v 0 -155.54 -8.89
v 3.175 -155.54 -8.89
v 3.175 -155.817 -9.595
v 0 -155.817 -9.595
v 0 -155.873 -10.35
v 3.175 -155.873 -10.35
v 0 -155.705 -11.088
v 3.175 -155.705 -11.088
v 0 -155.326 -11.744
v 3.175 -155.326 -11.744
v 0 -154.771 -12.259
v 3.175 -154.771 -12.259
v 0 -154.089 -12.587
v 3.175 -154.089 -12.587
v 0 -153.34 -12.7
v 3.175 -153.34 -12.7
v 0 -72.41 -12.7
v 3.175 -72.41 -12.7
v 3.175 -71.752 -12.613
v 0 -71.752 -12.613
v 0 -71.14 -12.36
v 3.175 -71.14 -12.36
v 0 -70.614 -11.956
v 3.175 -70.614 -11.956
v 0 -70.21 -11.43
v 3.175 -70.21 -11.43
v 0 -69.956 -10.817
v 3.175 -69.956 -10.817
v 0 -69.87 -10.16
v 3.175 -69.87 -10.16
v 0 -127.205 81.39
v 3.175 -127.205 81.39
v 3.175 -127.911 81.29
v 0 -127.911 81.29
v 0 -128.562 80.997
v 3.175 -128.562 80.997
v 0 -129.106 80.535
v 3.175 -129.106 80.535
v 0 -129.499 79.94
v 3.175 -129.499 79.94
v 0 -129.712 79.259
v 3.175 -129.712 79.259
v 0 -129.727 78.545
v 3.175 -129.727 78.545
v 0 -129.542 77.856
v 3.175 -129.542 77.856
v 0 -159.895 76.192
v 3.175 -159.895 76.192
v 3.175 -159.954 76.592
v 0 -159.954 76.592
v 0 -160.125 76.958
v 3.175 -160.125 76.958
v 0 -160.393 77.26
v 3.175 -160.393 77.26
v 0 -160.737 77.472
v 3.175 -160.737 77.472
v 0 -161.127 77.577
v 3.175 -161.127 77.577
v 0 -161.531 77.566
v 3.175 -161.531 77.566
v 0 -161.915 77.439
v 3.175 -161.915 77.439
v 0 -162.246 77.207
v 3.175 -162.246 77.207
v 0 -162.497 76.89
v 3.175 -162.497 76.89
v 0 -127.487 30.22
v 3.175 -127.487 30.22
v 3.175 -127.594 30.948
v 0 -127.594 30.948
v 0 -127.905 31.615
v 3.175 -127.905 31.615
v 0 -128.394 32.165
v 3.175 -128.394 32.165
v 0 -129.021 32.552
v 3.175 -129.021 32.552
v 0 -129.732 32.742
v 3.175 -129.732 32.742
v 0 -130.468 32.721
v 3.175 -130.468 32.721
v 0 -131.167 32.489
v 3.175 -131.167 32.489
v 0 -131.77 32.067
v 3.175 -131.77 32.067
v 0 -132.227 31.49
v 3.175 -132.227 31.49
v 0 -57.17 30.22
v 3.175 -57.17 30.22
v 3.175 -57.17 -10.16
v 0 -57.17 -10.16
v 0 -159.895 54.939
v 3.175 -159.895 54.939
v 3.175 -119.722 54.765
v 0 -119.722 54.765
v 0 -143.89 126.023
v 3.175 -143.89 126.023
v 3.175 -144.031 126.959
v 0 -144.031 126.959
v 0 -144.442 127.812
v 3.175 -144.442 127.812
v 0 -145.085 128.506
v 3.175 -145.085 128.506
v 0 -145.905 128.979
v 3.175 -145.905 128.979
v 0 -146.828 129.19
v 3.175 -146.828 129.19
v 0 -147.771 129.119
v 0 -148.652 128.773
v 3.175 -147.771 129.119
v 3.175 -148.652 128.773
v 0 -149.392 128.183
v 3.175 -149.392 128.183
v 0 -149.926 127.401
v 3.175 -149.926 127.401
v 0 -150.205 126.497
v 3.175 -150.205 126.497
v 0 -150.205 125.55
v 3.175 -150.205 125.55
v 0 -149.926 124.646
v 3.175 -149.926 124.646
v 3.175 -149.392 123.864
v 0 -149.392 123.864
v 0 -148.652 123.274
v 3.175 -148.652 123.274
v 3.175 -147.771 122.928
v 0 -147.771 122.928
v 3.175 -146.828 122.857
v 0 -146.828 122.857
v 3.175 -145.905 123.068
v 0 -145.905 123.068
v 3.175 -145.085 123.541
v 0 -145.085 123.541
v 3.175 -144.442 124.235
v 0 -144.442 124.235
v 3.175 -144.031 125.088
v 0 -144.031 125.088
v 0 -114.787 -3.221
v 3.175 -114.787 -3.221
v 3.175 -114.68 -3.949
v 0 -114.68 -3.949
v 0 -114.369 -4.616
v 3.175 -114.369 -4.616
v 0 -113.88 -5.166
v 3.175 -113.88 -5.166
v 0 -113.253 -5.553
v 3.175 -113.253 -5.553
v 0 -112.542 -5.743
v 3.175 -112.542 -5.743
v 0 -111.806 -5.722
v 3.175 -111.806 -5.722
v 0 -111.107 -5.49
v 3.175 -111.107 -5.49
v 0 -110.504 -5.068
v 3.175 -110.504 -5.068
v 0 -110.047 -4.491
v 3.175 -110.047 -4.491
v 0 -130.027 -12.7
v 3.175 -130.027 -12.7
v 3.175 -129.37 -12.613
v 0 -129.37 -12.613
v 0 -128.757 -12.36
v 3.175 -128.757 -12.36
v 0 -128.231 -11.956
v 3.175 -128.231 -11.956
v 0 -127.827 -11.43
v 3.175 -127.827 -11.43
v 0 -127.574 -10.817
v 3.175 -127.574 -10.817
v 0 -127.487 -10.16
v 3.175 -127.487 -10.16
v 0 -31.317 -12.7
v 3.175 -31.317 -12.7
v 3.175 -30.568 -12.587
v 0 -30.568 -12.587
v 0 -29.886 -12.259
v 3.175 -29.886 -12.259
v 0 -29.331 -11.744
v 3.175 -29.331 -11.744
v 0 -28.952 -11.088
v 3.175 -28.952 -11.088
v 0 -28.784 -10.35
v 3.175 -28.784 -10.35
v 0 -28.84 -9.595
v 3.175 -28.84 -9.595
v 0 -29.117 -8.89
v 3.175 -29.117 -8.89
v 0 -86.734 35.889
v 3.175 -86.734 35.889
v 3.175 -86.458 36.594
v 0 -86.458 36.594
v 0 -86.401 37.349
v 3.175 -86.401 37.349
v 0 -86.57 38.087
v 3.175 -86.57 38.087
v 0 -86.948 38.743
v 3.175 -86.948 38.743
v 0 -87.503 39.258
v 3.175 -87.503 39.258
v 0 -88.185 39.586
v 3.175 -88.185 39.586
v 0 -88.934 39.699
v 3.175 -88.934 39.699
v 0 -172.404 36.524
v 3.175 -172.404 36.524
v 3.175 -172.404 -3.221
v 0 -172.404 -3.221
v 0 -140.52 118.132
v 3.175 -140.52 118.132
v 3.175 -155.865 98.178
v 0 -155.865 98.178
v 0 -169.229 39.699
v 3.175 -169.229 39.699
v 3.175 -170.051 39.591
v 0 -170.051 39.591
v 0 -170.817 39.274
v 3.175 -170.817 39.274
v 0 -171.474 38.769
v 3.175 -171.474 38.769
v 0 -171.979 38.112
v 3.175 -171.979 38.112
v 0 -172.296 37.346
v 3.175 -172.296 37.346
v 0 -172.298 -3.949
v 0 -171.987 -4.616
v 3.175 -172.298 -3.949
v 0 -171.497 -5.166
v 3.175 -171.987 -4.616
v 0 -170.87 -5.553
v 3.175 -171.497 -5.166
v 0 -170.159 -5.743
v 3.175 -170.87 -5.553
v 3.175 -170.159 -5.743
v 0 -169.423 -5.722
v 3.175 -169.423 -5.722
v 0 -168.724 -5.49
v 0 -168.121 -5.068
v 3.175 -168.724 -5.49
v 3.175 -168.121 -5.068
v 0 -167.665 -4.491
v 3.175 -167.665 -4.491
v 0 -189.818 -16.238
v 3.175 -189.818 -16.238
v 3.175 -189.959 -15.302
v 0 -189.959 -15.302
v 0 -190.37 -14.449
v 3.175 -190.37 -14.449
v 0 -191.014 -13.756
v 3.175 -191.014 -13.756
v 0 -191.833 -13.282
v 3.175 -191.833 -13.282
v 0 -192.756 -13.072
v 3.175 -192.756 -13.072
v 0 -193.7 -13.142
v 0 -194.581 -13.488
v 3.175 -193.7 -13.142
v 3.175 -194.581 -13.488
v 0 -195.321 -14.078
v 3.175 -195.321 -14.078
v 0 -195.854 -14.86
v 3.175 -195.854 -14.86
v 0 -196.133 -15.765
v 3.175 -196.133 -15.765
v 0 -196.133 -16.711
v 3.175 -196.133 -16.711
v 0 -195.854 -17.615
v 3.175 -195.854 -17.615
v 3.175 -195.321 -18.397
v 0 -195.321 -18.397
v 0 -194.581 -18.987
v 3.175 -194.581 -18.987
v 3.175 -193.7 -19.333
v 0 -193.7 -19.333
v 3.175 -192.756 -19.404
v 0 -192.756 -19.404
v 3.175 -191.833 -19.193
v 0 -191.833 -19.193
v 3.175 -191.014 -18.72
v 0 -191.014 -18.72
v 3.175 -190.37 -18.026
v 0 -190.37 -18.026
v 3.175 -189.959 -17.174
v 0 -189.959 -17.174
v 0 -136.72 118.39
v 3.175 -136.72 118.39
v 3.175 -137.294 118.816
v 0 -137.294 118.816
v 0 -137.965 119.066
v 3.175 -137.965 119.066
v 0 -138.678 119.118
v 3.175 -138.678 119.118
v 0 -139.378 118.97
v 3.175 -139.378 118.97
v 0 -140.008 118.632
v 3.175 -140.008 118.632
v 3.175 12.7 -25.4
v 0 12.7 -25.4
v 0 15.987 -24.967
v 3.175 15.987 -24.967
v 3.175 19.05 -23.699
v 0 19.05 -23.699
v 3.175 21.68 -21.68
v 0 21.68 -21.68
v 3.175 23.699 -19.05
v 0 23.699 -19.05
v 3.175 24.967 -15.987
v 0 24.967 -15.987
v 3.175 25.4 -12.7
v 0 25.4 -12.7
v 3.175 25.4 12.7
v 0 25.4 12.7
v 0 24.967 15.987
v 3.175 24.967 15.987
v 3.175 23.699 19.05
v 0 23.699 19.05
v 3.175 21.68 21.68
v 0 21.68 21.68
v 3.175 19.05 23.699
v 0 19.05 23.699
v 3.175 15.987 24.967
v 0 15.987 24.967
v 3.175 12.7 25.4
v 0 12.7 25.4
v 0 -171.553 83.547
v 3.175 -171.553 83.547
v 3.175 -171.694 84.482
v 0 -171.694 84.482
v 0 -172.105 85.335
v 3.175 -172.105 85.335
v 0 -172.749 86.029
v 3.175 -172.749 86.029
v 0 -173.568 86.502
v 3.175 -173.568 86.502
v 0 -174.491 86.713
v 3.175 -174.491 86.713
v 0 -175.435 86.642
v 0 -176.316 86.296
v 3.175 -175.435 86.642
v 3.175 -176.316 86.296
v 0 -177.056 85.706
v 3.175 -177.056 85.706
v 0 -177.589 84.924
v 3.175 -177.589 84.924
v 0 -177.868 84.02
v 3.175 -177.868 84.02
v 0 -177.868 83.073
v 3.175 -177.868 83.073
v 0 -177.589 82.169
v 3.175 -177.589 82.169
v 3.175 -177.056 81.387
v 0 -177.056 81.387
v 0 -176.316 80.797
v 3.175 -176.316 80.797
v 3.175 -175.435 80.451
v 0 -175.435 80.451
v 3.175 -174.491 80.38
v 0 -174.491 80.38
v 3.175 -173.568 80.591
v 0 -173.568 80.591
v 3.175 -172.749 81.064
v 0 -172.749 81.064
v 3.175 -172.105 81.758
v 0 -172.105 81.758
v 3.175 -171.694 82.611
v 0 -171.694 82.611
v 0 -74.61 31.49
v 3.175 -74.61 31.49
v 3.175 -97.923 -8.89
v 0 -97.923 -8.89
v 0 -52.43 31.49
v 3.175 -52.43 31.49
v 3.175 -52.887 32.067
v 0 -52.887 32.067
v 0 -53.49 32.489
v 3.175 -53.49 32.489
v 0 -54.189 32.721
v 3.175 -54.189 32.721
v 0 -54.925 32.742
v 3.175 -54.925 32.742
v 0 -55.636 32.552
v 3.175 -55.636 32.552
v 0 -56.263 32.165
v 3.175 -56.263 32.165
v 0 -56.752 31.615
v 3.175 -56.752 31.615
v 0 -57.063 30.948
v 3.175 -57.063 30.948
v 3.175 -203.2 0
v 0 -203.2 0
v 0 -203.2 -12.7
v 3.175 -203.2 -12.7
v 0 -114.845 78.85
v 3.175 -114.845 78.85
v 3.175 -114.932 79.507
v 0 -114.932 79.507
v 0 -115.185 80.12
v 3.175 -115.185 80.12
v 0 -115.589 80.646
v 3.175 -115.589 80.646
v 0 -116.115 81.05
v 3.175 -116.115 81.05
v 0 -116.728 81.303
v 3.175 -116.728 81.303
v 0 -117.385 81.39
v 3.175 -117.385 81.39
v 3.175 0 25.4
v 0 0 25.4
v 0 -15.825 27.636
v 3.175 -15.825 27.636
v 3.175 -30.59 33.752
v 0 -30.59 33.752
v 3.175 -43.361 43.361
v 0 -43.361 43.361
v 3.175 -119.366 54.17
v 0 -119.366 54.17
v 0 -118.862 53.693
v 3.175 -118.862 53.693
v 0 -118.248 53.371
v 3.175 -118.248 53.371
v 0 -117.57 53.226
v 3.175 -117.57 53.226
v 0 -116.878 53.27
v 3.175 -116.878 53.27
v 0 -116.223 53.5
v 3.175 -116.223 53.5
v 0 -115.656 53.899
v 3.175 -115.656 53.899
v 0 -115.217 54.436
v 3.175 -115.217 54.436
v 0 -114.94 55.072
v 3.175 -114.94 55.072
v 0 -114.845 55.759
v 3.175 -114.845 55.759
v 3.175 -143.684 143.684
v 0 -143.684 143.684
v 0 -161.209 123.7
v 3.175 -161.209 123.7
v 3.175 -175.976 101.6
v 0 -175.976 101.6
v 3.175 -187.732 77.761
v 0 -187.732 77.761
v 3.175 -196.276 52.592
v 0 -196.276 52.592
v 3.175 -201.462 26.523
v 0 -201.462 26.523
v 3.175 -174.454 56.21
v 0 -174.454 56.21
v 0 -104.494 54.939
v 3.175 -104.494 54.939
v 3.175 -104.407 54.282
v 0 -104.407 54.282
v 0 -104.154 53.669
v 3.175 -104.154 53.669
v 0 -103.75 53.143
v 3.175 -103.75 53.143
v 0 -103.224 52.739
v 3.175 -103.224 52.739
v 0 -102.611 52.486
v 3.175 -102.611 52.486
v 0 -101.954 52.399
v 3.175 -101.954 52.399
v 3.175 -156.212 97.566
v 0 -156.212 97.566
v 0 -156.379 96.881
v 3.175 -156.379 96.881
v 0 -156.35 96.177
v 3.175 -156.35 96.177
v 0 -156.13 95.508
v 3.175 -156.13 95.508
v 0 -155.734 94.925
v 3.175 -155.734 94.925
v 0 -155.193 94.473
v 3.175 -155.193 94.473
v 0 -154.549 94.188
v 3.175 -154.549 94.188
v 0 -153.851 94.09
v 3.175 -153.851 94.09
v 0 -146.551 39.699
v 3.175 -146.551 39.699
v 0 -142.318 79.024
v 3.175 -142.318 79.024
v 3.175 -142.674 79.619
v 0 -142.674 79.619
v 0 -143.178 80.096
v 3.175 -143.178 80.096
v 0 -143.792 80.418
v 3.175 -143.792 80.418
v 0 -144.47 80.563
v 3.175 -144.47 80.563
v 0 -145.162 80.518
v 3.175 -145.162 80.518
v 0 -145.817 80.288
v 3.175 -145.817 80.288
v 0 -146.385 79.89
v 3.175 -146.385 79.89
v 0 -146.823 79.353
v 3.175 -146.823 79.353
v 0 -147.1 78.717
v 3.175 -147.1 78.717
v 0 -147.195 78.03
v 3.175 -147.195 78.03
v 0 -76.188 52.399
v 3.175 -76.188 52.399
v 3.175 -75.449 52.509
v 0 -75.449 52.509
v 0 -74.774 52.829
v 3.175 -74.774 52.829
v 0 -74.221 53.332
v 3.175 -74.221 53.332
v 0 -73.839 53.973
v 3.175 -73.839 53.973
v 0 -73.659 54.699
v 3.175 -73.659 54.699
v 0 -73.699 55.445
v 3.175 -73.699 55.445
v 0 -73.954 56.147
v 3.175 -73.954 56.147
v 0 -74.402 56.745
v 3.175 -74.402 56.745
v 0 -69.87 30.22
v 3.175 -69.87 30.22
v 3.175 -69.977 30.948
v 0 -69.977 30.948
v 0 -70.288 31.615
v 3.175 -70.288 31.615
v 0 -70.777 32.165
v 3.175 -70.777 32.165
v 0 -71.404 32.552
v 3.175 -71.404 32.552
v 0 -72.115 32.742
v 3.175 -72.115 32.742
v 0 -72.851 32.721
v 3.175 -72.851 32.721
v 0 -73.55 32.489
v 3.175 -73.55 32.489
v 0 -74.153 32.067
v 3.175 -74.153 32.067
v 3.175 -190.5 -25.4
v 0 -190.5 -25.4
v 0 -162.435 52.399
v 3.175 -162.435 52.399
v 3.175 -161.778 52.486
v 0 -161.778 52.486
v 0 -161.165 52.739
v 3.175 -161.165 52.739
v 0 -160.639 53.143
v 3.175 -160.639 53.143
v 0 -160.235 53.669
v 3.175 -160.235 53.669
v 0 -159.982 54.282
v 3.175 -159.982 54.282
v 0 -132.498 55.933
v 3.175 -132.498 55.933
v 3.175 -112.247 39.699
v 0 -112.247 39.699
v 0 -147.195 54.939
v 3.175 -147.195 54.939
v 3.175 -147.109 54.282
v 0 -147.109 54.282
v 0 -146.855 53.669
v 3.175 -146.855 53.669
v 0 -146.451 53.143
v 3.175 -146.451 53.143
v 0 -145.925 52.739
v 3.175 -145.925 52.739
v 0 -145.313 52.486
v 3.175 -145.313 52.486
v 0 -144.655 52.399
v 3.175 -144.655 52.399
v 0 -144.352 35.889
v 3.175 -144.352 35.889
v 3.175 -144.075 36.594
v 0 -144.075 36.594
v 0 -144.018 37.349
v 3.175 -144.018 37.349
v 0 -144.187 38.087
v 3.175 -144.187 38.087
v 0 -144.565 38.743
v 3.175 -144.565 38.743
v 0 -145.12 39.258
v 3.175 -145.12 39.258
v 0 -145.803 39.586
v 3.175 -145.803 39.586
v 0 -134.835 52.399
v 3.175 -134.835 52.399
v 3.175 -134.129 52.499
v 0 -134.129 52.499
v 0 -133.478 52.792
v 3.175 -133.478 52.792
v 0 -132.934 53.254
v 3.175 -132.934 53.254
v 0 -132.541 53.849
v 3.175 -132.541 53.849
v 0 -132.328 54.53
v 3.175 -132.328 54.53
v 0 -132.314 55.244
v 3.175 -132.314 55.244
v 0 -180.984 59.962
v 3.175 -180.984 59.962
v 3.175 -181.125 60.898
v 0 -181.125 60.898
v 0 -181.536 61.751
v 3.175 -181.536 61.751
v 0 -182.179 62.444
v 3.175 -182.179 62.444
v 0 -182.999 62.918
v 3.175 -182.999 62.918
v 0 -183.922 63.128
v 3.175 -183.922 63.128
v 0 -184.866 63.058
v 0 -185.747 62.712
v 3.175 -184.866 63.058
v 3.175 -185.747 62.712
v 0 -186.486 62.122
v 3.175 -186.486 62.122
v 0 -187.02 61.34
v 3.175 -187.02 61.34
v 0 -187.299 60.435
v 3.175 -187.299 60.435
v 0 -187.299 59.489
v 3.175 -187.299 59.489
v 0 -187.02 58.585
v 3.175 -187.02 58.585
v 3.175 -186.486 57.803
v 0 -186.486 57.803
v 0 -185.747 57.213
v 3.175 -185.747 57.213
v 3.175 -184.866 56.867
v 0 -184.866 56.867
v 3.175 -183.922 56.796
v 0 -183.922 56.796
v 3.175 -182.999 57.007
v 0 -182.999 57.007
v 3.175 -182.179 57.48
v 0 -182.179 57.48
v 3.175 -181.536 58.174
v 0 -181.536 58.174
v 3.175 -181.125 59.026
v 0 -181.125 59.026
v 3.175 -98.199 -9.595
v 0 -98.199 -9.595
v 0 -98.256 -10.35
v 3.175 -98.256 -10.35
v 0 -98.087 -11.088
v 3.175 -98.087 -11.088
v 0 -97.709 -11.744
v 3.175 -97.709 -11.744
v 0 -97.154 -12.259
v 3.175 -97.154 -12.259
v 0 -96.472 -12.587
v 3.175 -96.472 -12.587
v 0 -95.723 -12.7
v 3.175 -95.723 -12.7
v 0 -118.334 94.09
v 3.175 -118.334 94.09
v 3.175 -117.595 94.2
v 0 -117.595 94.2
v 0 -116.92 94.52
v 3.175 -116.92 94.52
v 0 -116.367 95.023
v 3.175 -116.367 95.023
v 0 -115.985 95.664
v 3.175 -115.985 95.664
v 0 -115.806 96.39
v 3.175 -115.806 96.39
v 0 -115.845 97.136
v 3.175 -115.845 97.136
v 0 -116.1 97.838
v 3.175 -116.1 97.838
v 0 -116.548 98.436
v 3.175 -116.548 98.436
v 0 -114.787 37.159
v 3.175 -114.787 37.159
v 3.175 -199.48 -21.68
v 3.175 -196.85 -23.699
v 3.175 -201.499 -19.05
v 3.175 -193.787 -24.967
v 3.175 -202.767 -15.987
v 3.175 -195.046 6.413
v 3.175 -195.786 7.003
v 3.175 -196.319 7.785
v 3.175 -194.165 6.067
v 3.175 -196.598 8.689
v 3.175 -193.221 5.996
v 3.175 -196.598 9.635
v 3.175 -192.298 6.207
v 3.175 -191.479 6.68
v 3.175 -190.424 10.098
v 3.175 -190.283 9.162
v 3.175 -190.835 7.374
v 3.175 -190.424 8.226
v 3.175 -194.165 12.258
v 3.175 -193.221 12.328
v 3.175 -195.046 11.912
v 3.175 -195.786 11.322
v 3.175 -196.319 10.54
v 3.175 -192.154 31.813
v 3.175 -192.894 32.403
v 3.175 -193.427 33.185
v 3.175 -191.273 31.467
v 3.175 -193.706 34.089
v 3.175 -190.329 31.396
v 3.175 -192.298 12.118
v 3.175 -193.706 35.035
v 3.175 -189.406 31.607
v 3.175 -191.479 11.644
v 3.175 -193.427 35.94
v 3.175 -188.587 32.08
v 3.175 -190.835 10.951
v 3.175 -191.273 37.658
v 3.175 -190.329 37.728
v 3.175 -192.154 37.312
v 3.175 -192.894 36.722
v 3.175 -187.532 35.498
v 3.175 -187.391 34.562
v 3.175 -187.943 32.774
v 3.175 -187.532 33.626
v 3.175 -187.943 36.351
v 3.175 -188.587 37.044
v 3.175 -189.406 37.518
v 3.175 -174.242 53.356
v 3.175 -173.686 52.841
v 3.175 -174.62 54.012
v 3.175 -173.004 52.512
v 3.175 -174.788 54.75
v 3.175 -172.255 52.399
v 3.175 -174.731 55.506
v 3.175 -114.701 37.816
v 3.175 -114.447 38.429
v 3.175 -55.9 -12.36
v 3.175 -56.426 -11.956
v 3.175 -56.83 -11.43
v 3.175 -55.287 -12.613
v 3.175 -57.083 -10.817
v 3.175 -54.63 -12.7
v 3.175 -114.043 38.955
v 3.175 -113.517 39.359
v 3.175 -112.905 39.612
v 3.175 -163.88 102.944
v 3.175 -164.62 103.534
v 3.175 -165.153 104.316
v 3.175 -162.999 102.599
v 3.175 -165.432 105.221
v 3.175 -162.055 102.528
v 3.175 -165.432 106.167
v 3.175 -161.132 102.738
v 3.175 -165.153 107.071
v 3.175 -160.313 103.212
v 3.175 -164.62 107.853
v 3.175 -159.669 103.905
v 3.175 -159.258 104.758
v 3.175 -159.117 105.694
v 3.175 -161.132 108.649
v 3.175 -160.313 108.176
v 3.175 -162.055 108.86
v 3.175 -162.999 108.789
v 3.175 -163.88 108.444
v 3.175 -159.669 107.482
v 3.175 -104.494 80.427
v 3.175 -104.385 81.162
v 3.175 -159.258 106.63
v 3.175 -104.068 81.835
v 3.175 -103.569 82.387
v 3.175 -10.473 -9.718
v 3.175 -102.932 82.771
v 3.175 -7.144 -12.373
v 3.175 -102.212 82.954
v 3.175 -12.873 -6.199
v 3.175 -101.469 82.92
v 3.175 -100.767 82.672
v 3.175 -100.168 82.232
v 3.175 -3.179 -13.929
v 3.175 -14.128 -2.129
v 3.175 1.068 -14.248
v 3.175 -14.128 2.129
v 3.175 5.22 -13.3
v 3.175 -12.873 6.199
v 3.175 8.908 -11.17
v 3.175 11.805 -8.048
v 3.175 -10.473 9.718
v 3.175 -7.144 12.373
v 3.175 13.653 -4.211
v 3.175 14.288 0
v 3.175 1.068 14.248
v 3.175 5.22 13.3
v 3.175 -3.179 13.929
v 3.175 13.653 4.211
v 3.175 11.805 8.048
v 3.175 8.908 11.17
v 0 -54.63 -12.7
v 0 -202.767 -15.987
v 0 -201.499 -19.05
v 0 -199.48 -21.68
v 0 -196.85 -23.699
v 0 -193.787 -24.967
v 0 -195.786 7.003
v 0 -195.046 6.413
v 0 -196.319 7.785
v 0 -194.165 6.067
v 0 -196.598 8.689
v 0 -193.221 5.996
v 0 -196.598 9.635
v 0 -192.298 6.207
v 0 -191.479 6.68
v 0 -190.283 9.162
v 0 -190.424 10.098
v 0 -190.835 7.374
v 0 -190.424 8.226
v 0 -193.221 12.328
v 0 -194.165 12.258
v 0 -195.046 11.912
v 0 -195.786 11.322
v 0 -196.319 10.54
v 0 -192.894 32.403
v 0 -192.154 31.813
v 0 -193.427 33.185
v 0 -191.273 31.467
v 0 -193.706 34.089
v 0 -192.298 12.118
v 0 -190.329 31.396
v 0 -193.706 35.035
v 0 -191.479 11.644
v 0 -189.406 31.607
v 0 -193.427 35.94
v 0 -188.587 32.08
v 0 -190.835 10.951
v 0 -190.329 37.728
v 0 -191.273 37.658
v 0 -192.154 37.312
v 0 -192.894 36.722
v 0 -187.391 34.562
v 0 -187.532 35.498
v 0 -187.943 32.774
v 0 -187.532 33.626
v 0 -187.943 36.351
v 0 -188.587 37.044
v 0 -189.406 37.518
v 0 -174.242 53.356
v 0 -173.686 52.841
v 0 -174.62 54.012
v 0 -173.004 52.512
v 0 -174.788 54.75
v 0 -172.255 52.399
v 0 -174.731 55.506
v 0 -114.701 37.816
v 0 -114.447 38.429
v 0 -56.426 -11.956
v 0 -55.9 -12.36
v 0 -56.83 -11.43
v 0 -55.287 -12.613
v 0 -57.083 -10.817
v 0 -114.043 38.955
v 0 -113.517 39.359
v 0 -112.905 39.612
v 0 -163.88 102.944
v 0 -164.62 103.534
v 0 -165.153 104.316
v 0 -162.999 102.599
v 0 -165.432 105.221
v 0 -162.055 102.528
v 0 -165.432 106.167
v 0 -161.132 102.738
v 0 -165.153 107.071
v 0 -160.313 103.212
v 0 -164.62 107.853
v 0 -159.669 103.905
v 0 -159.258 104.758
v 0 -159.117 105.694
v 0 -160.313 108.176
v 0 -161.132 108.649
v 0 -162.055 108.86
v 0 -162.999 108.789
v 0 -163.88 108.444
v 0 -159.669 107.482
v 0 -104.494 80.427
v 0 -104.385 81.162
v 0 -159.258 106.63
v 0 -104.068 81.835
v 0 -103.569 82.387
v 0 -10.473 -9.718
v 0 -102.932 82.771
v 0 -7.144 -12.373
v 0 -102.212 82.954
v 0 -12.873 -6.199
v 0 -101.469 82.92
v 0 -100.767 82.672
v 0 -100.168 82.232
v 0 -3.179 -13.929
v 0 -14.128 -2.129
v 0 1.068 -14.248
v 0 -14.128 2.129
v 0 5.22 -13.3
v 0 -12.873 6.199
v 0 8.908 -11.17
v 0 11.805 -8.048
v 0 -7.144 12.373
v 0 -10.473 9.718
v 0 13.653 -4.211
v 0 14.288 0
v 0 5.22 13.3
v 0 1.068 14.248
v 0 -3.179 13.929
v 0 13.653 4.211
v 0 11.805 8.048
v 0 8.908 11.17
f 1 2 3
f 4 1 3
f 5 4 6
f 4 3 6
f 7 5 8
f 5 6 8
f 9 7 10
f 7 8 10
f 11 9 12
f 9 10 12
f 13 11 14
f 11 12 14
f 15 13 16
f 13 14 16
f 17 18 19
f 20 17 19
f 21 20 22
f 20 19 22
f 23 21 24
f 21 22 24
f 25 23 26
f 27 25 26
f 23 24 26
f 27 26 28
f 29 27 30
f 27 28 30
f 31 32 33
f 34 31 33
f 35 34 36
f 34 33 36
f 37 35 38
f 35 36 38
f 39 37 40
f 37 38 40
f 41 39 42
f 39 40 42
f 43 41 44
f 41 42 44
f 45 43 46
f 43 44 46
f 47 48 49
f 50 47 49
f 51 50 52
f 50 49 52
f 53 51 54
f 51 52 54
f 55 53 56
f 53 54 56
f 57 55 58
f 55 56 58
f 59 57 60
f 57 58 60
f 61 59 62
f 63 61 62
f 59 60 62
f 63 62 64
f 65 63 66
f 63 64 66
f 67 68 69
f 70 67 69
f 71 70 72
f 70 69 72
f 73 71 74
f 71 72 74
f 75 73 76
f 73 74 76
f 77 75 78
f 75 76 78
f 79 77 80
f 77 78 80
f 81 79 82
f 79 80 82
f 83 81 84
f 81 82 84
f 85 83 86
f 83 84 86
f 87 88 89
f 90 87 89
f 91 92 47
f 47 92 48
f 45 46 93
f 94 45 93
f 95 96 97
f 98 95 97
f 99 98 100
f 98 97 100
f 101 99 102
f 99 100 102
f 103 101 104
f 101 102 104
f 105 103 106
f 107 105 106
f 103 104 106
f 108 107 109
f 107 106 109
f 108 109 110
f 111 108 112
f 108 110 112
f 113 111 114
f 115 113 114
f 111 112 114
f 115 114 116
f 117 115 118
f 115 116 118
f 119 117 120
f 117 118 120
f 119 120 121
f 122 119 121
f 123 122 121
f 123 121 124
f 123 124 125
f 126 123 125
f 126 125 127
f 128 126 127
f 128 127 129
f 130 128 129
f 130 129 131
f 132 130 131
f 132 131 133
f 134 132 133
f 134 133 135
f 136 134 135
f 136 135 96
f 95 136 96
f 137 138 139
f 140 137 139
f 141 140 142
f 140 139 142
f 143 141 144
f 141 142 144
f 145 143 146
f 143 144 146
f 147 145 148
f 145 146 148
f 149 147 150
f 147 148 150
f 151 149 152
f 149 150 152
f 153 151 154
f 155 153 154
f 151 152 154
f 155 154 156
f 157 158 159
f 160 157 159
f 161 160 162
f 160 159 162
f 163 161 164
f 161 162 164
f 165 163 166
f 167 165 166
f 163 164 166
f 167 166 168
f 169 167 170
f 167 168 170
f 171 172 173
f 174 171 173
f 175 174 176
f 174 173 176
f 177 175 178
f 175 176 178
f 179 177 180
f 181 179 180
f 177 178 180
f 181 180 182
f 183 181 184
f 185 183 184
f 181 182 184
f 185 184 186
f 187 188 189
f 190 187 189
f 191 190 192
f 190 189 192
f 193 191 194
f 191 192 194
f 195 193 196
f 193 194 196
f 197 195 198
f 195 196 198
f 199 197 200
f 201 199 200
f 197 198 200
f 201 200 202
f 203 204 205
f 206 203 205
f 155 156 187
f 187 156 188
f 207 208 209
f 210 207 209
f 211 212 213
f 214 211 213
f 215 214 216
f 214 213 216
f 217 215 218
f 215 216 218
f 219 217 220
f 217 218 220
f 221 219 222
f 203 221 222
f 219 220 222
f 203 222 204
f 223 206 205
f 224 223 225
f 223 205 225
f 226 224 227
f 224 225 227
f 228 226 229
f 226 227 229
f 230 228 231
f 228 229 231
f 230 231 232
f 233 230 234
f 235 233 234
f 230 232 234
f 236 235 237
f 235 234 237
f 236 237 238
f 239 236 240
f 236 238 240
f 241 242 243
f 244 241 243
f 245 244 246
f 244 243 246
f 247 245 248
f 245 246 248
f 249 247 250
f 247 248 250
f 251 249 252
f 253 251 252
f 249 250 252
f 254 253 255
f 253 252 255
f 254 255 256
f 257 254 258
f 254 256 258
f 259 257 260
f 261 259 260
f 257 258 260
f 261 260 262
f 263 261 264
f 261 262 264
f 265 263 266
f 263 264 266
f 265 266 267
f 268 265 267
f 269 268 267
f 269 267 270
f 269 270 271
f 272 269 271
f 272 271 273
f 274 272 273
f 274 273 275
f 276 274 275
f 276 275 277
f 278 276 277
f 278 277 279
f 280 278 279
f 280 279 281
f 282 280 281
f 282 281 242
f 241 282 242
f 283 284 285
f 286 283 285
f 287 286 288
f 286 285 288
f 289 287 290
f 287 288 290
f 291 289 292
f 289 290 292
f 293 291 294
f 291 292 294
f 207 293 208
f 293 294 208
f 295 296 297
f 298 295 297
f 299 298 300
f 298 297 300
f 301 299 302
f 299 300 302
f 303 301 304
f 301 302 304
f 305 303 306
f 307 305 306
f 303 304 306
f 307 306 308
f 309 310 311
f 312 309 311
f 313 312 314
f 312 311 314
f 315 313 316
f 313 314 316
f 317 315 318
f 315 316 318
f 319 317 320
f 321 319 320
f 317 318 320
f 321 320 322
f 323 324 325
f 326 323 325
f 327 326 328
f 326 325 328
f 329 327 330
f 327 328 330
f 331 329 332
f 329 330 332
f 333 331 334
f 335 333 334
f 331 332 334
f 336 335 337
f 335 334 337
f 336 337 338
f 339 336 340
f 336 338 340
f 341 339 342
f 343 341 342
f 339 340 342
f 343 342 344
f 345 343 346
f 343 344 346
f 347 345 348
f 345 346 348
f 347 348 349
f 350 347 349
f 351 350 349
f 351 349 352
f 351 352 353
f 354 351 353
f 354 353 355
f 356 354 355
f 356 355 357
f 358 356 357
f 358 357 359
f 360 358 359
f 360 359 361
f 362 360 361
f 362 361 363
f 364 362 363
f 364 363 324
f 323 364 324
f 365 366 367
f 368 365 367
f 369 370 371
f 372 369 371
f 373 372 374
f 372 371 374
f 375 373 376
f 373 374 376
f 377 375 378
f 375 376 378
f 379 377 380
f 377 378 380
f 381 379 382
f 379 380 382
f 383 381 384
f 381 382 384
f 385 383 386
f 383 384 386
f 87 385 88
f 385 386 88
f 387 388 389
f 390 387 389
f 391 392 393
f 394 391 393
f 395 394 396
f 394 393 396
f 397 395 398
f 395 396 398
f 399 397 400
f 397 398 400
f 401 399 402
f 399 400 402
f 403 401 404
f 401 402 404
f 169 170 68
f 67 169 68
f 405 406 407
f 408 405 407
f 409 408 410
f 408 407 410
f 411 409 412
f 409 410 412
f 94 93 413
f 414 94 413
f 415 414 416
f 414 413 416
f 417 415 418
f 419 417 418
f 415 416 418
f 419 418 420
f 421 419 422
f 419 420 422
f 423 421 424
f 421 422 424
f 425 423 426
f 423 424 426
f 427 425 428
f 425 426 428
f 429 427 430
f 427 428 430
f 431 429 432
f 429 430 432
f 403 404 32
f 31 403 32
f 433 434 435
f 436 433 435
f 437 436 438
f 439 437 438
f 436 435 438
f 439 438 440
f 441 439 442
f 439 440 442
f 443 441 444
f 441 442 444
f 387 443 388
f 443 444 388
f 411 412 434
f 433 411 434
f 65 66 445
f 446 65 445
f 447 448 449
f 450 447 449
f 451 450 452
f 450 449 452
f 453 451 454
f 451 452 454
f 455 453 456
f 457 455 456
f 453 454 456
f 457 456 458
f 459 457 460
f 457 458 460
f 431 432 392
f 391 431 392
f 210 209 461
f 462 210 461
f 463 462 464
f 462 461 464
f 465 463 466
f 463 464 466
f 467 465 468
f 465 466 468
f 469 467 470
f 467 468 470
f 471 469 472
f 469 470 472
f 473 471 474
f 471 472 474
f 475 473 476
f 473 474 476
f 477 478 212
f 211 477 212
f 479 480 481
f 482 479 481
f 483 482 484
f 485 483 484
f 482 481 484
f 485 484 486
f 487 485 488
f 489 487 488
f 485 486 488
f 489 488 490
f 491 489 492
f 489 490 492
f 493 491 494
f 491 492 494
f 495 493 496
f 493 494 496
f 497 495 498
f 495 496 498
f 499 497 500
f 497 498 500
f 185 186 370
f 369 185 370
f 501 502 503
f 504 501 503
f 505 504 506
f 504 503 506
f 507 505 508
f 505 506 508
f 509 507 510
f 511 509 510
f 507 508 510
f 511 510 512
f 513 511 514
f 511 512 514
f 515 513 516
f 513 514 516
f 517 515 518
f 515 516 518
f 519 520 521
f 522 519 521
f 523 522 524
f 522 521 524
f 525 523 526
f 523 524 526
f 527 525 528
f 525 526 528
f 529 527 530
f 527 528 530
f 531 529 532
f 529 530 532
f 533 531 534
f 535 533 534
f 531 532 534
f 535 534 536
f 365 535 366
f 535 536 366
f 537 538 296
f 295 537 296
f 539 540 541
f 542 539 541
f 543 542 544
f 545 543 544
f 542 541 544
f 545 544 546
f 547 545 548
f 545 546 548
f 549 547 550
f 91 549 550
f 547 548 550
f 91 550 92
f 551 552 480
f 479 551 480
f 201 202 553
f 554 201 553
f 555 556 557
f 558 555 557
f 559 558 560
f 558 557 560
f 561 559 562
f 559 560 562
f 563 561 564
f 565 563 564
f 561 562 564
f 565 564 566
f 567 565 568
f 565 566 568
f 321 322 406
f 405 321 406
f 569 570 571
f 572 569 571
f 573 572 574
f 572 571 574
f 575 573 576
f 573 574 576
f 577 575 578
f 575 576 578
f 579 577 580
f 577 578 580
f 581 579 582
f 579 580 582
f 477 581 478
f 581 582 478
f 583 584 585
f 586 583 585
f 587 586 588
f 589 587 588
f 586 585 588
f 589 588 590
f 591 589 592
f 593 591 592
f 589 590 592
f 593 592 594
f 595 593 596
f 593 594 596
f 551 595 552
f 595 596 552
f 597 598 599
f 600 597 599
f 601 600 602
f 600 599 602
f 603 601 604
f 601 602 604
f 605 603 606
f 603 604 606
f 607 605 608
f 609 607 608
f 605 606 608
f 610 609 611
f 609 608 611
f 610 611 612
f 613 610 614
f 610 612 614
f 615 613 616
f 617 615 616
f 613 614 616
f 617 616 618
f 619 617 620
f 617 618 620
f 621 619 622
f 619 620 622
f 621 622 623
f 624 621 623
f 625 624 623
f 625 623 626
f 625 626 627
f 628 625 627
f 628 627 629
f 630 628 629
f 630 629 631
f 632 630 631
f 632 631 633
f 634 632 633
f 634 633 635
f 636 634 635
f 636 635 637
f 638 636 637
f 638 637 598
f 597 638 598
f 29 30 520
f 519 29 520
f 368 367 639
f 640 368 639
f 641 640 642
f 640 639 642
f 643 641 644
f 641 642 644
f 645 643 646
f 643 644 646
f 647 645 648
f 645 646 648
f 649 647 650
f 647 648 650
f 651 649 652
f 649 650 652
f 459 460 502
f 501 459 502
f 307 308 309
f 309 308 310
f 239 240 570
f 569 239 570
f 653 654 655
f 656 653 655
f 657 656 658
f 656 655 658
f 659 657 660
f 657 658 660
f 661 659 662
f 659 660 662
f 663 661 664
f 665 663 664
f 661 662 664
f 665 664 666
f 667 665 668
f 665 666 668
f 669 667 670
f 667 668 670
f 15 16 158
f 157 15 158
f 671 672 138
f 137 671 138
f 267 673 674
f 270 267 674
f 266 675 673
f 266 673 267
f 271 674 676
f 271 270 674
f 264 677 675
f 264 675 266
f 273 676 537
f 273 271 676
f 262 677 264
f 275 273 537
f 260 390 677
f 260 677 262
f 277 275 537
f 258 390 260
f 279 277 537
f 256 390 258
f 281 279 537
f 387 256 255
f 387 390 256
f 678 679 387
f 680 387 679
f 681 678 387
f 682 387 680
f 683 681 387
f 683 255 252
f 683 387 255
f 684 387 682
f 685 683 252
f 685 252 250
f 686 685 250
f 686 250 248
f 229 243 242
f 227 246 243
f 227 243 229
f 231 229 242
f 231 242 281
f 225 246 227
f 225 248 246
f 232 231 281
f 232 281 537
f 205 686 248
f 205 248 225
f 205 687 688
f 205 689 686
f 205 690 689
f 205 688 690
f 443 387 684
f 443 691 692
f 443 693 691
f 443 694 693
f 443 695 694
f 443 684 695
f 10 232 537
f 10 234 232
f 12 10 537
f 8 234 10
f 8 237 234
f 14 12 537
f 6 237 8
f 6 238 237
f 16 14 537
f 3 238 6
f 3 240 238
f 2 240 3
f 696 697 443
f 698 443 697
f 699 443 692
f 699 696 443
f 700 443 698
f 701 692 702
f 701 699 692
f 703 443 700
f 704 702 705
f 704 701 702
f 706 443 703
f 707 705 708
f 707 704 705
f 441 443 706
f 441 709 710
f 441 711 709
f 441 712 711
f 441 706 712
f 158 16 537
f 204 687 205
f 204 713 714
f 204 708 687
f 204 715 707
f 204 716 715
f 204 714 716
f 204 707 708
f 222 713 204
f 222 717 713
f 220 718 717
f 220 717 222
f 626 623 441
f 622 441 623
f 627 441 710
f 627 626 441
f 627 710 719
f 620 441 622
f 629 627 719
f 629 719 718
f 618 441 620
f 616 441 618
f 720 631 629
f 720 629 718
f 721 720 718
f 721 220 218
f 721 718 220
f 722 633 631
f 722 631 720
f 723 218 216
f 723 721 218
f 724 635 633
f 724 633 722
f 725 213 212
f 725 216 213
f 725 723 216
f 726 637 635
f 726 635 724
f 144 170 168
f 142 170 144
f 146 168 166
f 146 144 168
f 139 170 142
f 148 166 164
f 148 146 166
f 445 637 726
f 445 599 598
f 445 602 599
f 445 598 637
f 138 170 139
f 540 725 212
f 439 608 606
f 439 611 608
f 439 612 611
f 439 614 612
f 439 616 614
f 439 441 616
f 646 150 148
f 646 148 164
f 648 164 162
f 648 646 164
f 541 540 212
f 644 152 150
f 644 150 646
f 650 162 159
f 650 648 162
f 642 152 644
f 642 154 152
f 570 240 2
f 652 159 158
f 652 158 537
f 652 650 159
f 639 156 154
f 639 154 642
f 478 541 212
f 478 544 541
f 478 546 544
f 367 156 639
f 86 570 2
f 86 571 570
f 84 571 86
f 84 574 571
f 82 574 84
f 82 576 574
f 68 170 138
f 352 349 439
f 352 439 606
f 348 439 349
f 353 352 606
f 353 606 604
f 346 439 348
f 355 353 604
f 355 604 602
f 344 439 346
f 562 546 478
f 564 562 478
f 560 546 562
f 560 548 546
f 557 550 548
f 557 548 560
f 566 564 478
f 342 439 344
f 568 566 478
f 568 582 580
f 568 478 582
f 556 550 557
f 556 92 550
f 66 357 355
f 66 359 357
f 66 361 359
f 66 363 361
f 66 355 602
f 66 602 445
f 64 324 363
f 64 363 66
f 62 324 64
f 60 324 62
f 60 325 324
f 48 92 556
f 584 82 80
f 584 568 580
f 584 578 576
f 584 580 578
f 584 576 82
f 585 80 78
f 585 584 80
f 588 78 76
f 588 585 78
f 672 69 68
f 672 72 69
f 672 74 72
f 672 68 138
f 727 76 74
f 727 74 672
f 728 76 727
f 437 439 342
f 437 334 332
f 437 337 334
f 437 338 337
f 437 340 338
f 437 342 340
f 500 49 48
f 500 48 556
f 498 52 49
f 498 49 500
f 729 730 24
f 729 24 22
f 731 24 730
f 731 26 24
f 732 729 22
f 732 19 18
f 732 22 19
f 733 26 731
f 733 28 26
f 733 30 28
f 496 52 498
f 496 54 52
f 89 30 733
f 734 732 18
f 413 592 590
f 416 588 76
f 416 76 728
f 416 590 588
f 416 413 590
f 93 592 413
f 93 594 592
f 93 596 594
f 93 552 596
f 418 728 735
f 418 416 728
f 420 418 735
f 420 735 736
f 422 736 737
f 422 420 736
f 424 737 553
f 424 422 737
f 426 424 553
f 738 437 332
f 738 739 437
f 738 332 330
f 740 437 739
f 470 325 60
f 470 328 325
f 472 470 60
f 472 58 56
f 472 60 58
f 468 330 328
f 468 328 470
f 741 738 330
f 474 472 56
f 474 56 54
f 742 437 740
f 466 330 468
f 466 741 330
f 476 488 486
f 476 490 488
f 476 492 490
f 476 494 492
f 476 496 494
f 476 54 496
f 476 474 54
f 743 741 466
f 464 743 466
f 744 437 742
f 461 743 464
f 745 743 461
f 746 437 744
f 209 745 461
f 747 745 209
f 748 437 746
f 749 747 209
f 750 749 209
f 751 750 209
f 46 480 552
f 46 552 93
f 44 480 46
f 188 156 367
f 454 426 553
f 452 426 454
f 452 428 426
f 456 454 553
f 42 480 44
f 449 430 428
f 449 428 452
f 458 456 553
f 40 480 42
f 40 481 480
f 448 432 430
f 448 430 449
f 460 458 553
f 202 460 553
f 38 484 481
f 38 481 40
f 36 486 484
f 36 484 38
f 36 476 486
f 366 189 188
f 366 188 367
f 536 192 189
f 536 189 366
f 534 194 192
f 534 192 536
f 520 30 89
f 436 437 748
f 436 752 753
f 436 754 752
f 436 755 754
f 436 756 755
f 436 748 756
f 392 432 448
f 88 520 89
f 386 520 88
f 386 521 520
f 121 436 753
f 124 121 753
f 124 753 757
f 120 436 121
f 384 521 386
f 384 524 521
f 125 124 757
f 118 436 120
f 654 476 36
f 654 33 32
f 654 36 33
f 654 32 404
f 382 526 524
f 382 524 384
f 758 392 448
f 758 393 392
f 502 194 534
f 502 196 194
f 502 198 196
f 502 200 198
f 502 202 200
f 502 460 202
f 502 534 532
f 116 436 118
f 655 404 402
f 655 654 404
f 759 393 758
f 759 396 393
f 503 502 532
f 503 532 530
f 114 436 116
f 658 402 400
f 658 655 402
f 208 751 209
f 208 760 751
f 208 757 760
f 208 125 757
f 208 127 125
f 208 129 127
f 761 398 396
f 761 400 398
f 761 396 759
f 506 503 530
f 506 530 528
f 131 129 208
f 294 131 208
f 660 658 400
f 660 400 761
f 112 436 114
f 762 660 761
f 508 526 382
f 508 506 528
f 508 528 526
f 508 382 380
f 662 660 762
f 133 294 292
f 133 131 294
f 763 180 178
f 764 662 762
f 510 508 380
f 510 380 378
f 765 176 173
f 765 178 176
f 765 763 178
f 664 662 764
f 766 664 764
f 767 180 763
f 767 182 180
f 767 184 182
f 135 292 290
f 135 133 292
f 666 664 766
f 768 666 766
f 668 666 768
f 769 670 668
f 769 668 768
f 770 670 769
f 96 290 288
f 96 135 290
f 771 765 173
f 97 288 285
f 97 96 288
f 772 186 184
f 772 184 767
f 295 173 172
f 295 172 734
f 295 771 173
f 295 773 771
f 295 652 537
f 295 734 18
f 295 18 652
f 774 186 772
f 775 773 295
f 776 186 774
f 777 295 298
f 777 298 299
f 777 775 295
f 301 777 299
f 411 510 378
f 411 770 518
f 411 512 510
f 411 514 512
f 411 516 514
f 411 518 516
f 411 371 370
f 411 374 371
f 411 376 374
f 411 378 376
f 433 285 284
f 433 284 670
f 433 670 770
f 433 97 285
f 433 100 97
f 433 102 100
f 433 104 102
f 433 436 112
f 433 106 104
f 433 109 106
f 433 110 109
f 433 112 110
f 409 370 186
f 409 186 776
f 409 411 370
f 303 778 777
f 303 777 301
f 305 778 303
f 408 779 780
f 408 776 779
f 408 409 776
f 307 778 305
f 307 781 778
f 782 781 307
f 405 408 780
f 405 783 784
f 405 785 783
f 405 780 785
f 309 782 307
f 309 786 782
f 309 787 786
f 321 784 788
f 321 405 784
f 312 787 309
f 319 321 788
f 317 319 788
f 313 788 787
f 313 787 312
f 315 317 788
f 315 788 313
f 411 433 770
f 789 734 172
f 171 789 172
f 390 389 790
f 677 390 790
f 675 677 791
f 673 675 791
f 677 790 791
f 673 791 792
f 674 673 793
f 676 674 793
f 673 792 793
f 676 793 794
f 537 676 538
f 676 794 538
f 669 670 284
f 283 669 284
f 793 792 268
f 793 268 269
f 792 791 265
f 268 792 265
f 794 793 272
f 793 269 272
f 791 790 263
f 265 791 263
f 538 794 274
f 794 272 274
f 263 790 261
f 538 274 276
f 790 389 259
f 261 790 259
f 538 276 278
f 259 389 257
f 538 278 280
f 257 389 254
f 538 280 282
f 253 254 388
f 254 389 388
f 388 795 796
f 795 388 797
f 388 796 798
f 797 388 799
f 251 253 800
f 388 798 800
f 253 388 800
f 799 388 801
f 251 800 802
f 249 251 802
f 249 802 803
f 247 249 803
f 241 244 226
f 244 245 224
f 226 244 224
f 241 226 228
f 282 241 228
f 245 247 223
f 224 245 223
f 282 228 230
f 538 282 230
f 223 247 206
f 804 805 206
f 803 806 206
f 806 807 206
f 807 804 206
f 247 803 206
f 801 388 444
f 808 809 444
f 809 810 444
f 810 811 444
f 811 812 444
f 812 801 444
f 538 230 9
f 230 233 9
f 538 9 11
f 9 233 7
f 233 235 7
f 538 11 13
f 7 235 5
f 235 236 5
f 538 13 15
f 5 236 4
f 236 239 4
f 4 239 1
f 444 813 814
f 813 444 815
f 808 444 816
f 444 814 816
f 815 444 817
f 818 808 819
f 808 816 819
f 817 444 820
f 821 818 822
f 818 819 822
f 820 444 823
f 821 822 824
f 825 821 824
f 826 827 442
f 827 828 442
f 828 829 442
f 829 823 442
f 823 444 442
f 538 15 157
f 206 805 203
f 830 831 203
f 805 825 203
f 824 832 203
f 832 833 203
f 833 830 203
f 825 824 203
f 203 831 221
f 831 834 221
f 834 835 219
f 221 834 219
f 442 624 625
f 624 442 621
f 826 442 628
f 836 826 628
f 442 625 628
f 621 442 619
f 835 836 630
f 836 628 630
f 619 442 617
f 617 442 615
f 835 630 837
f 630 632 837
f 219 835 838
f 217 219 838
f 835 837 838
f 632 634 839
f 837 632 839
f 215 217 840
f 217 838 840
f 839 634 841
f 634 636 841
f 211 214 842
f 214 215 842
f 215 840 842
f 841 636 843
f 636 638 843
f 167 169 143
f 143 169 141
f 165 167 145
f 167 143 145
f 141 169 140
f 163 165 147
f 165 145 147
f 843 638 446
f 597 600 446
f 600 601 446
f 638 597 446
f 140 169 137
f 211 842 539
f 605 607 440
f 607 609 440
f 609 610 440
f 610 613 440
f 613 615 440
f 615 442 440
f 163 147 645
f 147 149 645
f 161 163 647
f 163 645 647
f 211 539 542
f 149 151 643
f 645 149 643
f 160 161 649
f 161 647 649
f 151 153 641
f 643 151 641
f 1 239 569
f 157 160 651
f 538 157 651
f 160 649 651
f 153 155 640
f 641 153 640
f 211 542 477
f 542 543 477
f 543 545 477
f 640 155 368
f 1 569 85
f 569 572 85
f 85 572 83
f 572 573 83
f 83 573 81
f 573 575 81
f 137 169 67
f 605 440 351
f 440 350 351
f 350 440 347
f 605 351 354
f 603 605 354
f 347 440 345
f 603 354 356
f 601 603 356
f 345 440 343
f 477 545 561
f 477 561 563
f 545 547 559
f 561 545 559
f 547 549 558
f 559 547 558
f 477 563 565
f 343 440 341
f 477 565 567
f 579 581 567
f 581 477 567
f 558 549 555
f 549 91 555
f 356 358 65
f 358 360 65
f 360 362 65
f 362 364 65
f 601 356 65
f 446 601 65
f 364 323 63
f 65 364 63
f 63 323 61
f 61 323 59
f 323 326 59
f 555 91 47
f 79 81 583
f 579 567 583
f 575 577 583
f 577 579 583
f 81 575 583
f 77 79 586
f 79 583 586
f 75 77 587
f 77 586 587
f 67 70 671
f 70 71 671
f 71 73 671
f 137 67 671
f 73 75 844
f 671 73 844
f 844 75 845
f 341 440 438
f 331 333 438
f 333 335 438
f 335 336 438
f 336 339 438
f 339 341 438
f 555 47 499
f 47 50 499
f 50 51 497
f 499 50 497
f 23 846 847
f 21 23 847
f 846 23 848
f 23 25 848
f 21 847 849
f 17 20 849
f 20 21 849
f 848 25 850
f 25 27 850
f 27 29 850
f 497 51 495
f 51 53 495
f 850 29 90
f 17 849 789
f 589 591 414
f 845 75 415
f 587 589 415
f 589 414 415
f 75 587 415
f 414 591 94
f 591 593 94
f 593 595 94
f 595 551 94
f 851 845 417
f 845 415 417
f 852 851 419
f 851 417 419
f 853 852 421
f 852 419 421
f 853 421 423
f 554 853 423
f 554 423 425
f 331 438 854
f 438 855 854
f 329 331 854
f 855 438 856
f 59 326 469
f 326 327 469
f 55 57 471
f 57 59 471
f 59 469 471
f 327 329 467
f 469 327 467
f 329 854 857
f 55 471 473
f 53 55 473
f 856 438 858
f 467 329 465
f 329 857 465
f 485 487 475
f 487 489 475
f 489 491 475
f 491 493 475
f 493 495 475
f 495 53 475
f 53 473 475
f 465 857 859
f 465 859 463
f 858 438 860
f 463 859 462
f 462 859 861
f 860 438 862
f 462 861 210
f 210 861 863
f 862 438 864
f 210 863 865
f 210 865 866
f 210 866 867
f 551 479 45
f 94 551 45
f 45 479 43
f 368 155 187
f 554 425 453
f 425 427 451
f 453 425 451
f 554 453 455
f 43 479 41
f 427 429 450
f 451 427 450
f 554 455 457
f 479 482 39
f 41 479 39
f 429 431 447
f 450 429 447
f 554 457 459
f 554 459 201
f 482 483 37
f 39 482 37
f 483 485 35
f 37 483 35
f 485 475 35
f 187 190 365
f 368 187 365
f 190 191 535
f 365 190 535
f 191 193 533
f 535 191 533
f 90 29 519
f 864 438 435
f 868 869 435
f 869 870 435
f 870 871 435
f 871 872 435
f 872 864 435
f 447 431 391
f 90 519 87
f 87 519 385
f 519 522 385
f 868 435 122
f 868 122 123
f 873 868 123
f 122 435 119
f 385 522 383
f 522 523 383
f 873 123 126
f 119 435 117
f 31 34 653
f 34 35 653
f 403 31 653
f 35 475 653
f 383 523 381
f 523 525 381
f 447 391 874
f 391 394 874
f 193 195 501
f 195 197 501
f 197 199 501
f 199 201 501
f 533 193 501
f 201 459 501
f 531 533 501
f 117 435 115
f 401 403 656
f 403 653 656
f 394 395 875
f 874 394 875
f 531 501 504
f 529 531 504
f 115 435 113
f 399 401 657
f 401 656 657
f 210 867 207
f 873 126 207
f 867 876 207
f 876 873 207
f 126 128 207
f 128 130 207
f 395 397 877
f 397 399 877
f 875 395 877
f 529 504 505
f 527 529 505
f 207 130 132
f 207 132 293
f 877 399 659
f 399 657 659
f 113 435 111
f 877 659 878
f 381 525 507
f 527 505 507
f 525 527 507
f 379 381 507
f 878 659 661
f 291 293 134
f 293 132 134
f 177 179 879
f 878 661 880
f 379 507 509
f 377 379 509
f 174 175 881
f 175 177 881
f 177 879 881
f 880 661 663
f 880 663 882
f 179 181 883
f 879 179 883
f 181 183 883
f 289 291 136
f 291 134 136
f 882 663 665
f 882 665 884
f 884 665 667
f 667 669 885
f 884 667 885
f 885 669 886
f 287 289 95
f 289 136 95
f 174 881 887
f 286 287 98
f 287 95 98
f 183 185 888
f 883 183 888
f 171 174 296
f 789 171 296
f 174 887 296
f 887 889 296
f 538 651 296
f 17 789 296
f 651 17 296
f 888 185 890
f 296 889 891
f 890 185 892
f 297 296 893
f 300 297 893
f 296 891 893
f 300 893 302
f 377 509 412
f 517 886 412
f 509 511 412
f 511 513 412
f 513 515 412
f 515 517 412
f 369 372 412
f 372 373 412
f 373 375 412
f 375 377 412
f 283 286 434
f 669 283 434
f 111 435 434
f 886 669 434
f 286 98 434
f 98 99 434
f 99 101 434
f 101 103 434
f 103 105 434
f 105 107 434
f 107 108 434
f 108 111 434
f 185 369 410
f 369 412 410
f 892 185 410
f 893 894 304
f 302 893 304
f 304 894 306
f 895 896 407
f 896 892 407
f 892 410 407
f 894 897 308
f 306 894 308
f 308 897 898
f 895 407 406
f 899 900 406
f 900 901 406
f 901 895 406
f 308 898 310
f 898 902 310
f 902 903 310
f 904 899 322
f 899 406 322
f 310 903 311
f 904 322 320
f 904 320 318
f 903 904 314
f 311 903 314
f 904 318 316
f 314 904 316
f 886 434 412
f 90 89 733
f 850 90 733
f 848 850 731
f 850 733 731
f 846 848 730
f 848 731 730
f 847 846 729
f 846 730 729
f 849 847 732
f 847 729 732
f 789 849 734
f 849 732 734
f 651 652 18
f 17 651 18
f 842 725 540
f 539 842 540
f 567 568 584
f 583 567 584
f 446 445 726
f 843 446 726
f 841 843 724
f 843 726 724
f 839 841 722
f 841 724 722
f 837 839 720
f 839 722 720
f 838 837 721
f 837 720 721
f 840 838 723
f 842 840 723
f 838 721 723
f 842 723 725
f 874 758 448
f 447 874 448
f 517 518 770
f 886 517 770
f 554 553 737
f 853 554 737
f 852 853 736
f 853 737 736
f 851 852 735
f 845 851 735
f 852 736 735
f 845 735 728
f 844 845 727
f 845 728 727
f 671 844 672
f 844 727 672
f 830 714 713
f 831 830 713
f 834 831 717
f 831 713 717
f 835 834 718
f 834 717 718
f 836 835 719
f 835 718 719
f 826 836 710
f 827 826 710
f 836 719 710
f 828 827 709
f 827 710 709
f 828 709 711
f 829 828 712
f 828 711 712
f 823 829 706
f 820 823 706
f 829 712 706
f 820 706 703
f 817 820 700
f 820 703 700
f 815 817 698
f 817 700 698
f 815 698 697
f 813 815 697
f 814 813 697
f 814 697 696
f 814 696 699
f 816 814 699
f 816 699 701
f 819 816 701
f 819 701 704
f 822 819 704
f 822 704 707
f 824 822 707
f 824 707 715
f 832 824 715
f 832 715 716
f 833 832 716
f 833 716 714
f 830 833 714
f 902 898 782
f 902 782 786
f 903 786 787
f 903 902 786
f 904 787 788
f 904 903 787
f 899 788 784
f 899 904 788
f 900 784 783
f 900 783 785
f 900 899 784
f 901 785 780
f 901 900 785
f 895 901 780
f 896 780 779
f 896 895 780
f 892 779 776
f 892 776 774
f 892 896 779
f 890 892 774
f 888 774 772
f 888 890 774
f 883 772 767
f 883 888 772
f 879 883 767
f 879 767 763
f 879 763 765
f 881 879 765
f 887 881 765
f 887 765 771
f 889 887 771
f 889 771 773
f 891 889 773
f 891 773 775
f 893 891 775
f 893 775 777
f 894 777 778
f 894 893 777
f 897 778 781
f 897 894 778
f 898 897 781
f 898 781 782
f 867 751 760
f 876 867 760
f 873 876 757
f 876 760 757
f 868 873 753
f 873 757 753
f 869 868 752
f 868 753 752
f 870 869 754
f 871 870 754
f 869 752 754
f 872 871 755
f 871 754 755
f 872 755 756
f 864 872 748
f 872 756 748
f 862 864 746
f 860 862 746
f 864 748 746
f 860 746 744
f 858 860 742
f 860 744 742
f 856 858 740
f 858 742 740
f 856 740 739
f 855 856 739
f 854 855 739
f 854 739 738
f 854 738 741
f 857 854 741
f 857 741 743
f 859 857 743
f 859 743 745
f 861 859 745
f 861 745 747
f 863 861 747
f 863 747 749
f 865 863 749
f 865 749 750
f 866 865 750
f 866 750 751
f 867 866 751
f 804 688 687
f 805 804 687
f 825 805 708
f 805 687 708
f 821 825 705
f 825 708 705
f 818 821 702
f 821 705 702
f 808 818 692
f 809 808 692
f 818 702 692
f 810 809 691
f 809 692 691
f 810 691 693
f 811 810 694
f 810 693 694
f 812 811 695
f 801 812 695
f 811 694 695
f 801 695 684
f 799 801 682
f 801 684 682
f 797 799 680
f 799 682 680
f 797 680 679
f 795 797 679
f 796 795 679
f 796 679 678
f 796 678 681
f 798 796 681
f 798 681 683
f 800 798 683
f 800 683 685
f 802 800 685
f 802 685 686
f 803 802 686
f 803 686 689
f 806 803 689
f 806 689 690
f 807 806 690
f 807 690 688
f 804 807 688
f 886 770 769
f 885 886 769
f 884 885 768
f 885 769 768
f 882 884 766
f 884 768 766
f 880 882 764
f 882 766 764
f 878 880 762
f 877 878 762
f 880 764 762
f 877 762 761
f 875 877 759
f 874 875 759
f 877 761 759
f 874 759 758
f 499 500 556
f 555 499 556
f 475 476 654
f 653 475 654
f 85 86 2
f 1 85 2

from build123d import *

# Parameters (mm, degrees)
F0_R     = 14.2875
F1_DEPTH = 3.175
F2_R     = 3.175
F3_DEPTH = 25.4
F5_DEPTH = 25.4


with BuildPart() as f1:
    # F0 (on Right) → F1 (new body)
    with BuildSketch(Plane.YZ):
        with BuildLine():
            Line((-190.5, -25.4), (12.7, -25.4))
            ThreePointArc((12.7, -25.4), (21.680256, -21.680256), (25.4, -12.7))
            Line((25.4, -12.7), (25.4, 12.7))
            ThreePointArc((25.4, 12.7), (21.680256, 21.680256), (12.7, 25.4))
            Line((12.7, 25.4), (0, 25.4))
            ThreePointArc((0, 25.4), (-23.400478, 30.227273), (-43.360512, 43.360512))
            Line((-43.360512, 43.360512), (-143.684098, 143.684098))
            ThreePointArc((-143.684098, 143.684098), (-187.732321, 77.761273), (-203.2, 0))
            Line((-203.2, 0), (-203.2, -12.7))
            ThreePointArc((-203.2, -12.7), (-199.480256, -21.680256), (-190.5, -25.4))
        make_face()
        Circle(F0_R, mode=Mode.SUBTRACT)
    extrude(amount=F1_DEPTH)

    # F2 (on face) → F3 (cut)
    with BuildSketch(Plane.YZ.offset(3.175)):
        with Locations((-192.993104, -16.237834)):
            Circle(F2_R)
        with Locations((-193.458162, 9.162166)):
            Circle(F2_R)
        with Locations((-147.064992, 126.023386)):
            Circle(F2_R)
        with Locations((-162.292342, 105.693904)):
            Circle(F2_R)
        with Locations((-174.728316, 83.546522)):
            Circle(F2_R)
        with Locations((-184.159019, 59.962166)):
            Circle(F2_R)
        with Locations((-190.566163, 34.562166)):
            Circle(F2_R)
    extrude(amount=-F3_DEPTH, mode=Mode.SUBTRACT)

    # F4 (on face) → F5 (cut)
    with BuildSketch(Plane.YZ.offset(3.175)):
        with BuildLine():
            ThreePointArc((-52.430116, 31.489606), (-55.287221, 32.673058), (-57.16982, 30.219606))
            Line((-57.16982, 30.219606), (-57.16982, -10.16))
            ThreePointArc((-57.16982, -10.16), (-56.425871, -11.956051), (-54.62982, -12.7))
            Line((-54.62982, -12.7), (-31.316644, -12.7))
            ThreePointArc((-31.316644, -12.7), (-29.116939, -11.43), (-29.116939, -8.89))
            Line((-29.116939, -8.89), (-52.430116, 31.489606))
        make_face()
        with BuildLine():
            ThreePointArc((-72.40982, -12.7), (-70.613769, -11.956051), (-69.86982, -10.16))
            Line((-69.86982, -10.16), (-69.86982, 30.219606))
            ThreePointArc((-69.86982, 30.219606), (-71.75242, 32.673058), (-74.609525, 31.489606))
            Line((-74.609525, 31.489606), (-97.922701, -8.89))
            ThreePointArc((-97.922701, -8.89), (-97.922701, -11.43), (-95.722997, -12.7))
            Line((-95.722997, -12.7), (-72.40982, -12.7))
        make_face()
        with BuildLine():
            ThreePointArc((-114.787103, -3.220591), (-112.904503, -5.674043), (-110.047398, -4.490591))
            Line((-110.047398, -4.490591), (-86.734222, 35.889015))
            ThreePointArc((-86.734222, 35.889015), (-86.734222, 38.429015), (-88.933926, 39.699015))
            Line((-88.933926, 39.699015), (-112.247103, 39.699015))
            ThreePointArc((-112.247103, 39.699015), (-114.043154, 38.955067), (-114.787103, 37.159015))
            Line((-114.787103, 37.159015), (-114.787103, -3.220591))
        make_face()
        with BuildLine():
            Line((-127.487103, -10.16), (-127.487103, 30.219606))
            ThreePointArc((-127.487103, 30.219606), (-129.369702, 32.673058), (-132.226807, 31.489606))
            Line((-132.226807, 31.489606), (-155.539984, -8.89))
            ThreePointArc((-155.539984, -8.89), (-155.539984, -11.43), (-153.340279, -12.7))
            Line((-153.340279, -12.7), (-130.027103, -12.7))
            ThreePointArc((-130.027103, -12.7), (-128.231051, -11.956051), (-127.487103, -10.16))
        make_face()
        with BuildLine():
            ThreePointArc((-169.229385, 39.699015), (-171.474449, 38.769079), (-172.404385, 36.524015))
            Line((-172.404385, 36.524015), (-172.404385, -3.220591))
            ThreePointArc((-172.404385, -3.220591), (-170.521786, -5.674043), (-167.664681, -4.490591))
            Line((-167.664681, -4.490591), (-144.351504, 35.889015))
            ThreePointArc((-144.351504, 35.889015), (-144.351504, 38.429015), (-146.551209, 39.699015))
            Line((-146.551209, 39.699015), (-169.229385, 39.699015))
        make_face()
        with BuildLine():
            Line((-162.496961, 76.890181), (-174.454135, 56.210428))
            ThreePointArc((-174.454135, 56.210428), (-174.455359, 53.669722), (-172.255247, 52.399015))
            Line((-172.255247, 52.399015), (-162.435202, 52.399015))
            ThreePointArc((-162.435202, 52.399015), (-160.63915, 53.142964), (-159.895202, 54.939015))
            Line((-159.895202, 54.939015), (-159.895202, 76.192146))
            ThreePointArc((-159.895202, 76.192146), (-160.92836, 77.539032), (-162.496961, 76.890181))
        make_face()
        with BuildLine():
            ThreePointArc((-142.3178, 79.023671), (-145.162448, 80.518448), (-147.195202, 78.029613))
            Line((-147.195202, 78.029613), (-147.195202, 54.939015))
            ThreePointArc((-147.195202, 54.939015), (-146.451253, 53.142964), (-144.655202, 52.399015))
            Line((-144.655202, 52.399015), (-134.835156, 52.399015))
            ThreePointArc((-134.835156, 52.399015), (-132.716607, 53.537821), (-132.497754, 55.933073))
            Line((-132.497754, 55.933073), (-142.3178, 79.023671))
        make_face()
        with BuildLine():
            ThreePointArc((-127.205028, 81.389885), (-129.323578, 80.25108), (-129.54243, 77.855827))
            Line((-129.54243, 77.855827), (-119.722385, 54.765229))
            ThreePointArc((-119.722385, 54.765229), (-116.877736, 53.270452), (-114.844983, 55.759288))
            Line((-114.844983, 55.759288), (-114.844983, 78.849885))
            ThreePointArc((-114.844983, 78.849885), (-115.588931, 80.645936), (-117.384983, 81.389885))
            Line((-117.384983, 81.389885), (-127.205028, 81.389885))
        make_face()
        with BuildLine():
            Line((-104.493987, 80.426647), (-104.493987, 54.939015))
            ThreePointArc((-104.493987, 54.939015), (-103.750038, 53.142964), (-101.953987, 52.399015))
            Line((-101.953987, 52.399015), (-76.188018, 52.399015))
            ThreePointArc((-76.188018, 52.399015), (-73.838733, 53.973375), (-74.401746, 56.744794))
            Line((-74.401746, 56.744794), (-100.167715, 82.232425))
            ThreePointArc((-100.167715, 82.232425), (-102.932371, 82.770653), (-104.493987, 80.426647))
        make_face()
        with BuildLine():
            Line((-153.851107, 94.089885), (-118.334172, 94.089885))
            ThreePointArc((-118.334172, 94.089885), (-115.984887, 95.664245), (-116.5479, 98.435663))
            Line((-116.5479, 98.435663), (-136.720031, 118.389885))
            ThreePointArc((-136.720031, 118.389885), (-138.677975, 119.118298), (-140.519792, 118.13248))
            Line((-140.519792, 118.13248), (-155.864596, 98.178259))
            ThreePointArc((-155.864596, 98.178259), (-156.129755, 95.507671), (-153.851107, 94.089885))
        make_face()
    extrude(amount=-F5_DEPTH, mode=Mode.SUBTRACT)


solid = f1.part
